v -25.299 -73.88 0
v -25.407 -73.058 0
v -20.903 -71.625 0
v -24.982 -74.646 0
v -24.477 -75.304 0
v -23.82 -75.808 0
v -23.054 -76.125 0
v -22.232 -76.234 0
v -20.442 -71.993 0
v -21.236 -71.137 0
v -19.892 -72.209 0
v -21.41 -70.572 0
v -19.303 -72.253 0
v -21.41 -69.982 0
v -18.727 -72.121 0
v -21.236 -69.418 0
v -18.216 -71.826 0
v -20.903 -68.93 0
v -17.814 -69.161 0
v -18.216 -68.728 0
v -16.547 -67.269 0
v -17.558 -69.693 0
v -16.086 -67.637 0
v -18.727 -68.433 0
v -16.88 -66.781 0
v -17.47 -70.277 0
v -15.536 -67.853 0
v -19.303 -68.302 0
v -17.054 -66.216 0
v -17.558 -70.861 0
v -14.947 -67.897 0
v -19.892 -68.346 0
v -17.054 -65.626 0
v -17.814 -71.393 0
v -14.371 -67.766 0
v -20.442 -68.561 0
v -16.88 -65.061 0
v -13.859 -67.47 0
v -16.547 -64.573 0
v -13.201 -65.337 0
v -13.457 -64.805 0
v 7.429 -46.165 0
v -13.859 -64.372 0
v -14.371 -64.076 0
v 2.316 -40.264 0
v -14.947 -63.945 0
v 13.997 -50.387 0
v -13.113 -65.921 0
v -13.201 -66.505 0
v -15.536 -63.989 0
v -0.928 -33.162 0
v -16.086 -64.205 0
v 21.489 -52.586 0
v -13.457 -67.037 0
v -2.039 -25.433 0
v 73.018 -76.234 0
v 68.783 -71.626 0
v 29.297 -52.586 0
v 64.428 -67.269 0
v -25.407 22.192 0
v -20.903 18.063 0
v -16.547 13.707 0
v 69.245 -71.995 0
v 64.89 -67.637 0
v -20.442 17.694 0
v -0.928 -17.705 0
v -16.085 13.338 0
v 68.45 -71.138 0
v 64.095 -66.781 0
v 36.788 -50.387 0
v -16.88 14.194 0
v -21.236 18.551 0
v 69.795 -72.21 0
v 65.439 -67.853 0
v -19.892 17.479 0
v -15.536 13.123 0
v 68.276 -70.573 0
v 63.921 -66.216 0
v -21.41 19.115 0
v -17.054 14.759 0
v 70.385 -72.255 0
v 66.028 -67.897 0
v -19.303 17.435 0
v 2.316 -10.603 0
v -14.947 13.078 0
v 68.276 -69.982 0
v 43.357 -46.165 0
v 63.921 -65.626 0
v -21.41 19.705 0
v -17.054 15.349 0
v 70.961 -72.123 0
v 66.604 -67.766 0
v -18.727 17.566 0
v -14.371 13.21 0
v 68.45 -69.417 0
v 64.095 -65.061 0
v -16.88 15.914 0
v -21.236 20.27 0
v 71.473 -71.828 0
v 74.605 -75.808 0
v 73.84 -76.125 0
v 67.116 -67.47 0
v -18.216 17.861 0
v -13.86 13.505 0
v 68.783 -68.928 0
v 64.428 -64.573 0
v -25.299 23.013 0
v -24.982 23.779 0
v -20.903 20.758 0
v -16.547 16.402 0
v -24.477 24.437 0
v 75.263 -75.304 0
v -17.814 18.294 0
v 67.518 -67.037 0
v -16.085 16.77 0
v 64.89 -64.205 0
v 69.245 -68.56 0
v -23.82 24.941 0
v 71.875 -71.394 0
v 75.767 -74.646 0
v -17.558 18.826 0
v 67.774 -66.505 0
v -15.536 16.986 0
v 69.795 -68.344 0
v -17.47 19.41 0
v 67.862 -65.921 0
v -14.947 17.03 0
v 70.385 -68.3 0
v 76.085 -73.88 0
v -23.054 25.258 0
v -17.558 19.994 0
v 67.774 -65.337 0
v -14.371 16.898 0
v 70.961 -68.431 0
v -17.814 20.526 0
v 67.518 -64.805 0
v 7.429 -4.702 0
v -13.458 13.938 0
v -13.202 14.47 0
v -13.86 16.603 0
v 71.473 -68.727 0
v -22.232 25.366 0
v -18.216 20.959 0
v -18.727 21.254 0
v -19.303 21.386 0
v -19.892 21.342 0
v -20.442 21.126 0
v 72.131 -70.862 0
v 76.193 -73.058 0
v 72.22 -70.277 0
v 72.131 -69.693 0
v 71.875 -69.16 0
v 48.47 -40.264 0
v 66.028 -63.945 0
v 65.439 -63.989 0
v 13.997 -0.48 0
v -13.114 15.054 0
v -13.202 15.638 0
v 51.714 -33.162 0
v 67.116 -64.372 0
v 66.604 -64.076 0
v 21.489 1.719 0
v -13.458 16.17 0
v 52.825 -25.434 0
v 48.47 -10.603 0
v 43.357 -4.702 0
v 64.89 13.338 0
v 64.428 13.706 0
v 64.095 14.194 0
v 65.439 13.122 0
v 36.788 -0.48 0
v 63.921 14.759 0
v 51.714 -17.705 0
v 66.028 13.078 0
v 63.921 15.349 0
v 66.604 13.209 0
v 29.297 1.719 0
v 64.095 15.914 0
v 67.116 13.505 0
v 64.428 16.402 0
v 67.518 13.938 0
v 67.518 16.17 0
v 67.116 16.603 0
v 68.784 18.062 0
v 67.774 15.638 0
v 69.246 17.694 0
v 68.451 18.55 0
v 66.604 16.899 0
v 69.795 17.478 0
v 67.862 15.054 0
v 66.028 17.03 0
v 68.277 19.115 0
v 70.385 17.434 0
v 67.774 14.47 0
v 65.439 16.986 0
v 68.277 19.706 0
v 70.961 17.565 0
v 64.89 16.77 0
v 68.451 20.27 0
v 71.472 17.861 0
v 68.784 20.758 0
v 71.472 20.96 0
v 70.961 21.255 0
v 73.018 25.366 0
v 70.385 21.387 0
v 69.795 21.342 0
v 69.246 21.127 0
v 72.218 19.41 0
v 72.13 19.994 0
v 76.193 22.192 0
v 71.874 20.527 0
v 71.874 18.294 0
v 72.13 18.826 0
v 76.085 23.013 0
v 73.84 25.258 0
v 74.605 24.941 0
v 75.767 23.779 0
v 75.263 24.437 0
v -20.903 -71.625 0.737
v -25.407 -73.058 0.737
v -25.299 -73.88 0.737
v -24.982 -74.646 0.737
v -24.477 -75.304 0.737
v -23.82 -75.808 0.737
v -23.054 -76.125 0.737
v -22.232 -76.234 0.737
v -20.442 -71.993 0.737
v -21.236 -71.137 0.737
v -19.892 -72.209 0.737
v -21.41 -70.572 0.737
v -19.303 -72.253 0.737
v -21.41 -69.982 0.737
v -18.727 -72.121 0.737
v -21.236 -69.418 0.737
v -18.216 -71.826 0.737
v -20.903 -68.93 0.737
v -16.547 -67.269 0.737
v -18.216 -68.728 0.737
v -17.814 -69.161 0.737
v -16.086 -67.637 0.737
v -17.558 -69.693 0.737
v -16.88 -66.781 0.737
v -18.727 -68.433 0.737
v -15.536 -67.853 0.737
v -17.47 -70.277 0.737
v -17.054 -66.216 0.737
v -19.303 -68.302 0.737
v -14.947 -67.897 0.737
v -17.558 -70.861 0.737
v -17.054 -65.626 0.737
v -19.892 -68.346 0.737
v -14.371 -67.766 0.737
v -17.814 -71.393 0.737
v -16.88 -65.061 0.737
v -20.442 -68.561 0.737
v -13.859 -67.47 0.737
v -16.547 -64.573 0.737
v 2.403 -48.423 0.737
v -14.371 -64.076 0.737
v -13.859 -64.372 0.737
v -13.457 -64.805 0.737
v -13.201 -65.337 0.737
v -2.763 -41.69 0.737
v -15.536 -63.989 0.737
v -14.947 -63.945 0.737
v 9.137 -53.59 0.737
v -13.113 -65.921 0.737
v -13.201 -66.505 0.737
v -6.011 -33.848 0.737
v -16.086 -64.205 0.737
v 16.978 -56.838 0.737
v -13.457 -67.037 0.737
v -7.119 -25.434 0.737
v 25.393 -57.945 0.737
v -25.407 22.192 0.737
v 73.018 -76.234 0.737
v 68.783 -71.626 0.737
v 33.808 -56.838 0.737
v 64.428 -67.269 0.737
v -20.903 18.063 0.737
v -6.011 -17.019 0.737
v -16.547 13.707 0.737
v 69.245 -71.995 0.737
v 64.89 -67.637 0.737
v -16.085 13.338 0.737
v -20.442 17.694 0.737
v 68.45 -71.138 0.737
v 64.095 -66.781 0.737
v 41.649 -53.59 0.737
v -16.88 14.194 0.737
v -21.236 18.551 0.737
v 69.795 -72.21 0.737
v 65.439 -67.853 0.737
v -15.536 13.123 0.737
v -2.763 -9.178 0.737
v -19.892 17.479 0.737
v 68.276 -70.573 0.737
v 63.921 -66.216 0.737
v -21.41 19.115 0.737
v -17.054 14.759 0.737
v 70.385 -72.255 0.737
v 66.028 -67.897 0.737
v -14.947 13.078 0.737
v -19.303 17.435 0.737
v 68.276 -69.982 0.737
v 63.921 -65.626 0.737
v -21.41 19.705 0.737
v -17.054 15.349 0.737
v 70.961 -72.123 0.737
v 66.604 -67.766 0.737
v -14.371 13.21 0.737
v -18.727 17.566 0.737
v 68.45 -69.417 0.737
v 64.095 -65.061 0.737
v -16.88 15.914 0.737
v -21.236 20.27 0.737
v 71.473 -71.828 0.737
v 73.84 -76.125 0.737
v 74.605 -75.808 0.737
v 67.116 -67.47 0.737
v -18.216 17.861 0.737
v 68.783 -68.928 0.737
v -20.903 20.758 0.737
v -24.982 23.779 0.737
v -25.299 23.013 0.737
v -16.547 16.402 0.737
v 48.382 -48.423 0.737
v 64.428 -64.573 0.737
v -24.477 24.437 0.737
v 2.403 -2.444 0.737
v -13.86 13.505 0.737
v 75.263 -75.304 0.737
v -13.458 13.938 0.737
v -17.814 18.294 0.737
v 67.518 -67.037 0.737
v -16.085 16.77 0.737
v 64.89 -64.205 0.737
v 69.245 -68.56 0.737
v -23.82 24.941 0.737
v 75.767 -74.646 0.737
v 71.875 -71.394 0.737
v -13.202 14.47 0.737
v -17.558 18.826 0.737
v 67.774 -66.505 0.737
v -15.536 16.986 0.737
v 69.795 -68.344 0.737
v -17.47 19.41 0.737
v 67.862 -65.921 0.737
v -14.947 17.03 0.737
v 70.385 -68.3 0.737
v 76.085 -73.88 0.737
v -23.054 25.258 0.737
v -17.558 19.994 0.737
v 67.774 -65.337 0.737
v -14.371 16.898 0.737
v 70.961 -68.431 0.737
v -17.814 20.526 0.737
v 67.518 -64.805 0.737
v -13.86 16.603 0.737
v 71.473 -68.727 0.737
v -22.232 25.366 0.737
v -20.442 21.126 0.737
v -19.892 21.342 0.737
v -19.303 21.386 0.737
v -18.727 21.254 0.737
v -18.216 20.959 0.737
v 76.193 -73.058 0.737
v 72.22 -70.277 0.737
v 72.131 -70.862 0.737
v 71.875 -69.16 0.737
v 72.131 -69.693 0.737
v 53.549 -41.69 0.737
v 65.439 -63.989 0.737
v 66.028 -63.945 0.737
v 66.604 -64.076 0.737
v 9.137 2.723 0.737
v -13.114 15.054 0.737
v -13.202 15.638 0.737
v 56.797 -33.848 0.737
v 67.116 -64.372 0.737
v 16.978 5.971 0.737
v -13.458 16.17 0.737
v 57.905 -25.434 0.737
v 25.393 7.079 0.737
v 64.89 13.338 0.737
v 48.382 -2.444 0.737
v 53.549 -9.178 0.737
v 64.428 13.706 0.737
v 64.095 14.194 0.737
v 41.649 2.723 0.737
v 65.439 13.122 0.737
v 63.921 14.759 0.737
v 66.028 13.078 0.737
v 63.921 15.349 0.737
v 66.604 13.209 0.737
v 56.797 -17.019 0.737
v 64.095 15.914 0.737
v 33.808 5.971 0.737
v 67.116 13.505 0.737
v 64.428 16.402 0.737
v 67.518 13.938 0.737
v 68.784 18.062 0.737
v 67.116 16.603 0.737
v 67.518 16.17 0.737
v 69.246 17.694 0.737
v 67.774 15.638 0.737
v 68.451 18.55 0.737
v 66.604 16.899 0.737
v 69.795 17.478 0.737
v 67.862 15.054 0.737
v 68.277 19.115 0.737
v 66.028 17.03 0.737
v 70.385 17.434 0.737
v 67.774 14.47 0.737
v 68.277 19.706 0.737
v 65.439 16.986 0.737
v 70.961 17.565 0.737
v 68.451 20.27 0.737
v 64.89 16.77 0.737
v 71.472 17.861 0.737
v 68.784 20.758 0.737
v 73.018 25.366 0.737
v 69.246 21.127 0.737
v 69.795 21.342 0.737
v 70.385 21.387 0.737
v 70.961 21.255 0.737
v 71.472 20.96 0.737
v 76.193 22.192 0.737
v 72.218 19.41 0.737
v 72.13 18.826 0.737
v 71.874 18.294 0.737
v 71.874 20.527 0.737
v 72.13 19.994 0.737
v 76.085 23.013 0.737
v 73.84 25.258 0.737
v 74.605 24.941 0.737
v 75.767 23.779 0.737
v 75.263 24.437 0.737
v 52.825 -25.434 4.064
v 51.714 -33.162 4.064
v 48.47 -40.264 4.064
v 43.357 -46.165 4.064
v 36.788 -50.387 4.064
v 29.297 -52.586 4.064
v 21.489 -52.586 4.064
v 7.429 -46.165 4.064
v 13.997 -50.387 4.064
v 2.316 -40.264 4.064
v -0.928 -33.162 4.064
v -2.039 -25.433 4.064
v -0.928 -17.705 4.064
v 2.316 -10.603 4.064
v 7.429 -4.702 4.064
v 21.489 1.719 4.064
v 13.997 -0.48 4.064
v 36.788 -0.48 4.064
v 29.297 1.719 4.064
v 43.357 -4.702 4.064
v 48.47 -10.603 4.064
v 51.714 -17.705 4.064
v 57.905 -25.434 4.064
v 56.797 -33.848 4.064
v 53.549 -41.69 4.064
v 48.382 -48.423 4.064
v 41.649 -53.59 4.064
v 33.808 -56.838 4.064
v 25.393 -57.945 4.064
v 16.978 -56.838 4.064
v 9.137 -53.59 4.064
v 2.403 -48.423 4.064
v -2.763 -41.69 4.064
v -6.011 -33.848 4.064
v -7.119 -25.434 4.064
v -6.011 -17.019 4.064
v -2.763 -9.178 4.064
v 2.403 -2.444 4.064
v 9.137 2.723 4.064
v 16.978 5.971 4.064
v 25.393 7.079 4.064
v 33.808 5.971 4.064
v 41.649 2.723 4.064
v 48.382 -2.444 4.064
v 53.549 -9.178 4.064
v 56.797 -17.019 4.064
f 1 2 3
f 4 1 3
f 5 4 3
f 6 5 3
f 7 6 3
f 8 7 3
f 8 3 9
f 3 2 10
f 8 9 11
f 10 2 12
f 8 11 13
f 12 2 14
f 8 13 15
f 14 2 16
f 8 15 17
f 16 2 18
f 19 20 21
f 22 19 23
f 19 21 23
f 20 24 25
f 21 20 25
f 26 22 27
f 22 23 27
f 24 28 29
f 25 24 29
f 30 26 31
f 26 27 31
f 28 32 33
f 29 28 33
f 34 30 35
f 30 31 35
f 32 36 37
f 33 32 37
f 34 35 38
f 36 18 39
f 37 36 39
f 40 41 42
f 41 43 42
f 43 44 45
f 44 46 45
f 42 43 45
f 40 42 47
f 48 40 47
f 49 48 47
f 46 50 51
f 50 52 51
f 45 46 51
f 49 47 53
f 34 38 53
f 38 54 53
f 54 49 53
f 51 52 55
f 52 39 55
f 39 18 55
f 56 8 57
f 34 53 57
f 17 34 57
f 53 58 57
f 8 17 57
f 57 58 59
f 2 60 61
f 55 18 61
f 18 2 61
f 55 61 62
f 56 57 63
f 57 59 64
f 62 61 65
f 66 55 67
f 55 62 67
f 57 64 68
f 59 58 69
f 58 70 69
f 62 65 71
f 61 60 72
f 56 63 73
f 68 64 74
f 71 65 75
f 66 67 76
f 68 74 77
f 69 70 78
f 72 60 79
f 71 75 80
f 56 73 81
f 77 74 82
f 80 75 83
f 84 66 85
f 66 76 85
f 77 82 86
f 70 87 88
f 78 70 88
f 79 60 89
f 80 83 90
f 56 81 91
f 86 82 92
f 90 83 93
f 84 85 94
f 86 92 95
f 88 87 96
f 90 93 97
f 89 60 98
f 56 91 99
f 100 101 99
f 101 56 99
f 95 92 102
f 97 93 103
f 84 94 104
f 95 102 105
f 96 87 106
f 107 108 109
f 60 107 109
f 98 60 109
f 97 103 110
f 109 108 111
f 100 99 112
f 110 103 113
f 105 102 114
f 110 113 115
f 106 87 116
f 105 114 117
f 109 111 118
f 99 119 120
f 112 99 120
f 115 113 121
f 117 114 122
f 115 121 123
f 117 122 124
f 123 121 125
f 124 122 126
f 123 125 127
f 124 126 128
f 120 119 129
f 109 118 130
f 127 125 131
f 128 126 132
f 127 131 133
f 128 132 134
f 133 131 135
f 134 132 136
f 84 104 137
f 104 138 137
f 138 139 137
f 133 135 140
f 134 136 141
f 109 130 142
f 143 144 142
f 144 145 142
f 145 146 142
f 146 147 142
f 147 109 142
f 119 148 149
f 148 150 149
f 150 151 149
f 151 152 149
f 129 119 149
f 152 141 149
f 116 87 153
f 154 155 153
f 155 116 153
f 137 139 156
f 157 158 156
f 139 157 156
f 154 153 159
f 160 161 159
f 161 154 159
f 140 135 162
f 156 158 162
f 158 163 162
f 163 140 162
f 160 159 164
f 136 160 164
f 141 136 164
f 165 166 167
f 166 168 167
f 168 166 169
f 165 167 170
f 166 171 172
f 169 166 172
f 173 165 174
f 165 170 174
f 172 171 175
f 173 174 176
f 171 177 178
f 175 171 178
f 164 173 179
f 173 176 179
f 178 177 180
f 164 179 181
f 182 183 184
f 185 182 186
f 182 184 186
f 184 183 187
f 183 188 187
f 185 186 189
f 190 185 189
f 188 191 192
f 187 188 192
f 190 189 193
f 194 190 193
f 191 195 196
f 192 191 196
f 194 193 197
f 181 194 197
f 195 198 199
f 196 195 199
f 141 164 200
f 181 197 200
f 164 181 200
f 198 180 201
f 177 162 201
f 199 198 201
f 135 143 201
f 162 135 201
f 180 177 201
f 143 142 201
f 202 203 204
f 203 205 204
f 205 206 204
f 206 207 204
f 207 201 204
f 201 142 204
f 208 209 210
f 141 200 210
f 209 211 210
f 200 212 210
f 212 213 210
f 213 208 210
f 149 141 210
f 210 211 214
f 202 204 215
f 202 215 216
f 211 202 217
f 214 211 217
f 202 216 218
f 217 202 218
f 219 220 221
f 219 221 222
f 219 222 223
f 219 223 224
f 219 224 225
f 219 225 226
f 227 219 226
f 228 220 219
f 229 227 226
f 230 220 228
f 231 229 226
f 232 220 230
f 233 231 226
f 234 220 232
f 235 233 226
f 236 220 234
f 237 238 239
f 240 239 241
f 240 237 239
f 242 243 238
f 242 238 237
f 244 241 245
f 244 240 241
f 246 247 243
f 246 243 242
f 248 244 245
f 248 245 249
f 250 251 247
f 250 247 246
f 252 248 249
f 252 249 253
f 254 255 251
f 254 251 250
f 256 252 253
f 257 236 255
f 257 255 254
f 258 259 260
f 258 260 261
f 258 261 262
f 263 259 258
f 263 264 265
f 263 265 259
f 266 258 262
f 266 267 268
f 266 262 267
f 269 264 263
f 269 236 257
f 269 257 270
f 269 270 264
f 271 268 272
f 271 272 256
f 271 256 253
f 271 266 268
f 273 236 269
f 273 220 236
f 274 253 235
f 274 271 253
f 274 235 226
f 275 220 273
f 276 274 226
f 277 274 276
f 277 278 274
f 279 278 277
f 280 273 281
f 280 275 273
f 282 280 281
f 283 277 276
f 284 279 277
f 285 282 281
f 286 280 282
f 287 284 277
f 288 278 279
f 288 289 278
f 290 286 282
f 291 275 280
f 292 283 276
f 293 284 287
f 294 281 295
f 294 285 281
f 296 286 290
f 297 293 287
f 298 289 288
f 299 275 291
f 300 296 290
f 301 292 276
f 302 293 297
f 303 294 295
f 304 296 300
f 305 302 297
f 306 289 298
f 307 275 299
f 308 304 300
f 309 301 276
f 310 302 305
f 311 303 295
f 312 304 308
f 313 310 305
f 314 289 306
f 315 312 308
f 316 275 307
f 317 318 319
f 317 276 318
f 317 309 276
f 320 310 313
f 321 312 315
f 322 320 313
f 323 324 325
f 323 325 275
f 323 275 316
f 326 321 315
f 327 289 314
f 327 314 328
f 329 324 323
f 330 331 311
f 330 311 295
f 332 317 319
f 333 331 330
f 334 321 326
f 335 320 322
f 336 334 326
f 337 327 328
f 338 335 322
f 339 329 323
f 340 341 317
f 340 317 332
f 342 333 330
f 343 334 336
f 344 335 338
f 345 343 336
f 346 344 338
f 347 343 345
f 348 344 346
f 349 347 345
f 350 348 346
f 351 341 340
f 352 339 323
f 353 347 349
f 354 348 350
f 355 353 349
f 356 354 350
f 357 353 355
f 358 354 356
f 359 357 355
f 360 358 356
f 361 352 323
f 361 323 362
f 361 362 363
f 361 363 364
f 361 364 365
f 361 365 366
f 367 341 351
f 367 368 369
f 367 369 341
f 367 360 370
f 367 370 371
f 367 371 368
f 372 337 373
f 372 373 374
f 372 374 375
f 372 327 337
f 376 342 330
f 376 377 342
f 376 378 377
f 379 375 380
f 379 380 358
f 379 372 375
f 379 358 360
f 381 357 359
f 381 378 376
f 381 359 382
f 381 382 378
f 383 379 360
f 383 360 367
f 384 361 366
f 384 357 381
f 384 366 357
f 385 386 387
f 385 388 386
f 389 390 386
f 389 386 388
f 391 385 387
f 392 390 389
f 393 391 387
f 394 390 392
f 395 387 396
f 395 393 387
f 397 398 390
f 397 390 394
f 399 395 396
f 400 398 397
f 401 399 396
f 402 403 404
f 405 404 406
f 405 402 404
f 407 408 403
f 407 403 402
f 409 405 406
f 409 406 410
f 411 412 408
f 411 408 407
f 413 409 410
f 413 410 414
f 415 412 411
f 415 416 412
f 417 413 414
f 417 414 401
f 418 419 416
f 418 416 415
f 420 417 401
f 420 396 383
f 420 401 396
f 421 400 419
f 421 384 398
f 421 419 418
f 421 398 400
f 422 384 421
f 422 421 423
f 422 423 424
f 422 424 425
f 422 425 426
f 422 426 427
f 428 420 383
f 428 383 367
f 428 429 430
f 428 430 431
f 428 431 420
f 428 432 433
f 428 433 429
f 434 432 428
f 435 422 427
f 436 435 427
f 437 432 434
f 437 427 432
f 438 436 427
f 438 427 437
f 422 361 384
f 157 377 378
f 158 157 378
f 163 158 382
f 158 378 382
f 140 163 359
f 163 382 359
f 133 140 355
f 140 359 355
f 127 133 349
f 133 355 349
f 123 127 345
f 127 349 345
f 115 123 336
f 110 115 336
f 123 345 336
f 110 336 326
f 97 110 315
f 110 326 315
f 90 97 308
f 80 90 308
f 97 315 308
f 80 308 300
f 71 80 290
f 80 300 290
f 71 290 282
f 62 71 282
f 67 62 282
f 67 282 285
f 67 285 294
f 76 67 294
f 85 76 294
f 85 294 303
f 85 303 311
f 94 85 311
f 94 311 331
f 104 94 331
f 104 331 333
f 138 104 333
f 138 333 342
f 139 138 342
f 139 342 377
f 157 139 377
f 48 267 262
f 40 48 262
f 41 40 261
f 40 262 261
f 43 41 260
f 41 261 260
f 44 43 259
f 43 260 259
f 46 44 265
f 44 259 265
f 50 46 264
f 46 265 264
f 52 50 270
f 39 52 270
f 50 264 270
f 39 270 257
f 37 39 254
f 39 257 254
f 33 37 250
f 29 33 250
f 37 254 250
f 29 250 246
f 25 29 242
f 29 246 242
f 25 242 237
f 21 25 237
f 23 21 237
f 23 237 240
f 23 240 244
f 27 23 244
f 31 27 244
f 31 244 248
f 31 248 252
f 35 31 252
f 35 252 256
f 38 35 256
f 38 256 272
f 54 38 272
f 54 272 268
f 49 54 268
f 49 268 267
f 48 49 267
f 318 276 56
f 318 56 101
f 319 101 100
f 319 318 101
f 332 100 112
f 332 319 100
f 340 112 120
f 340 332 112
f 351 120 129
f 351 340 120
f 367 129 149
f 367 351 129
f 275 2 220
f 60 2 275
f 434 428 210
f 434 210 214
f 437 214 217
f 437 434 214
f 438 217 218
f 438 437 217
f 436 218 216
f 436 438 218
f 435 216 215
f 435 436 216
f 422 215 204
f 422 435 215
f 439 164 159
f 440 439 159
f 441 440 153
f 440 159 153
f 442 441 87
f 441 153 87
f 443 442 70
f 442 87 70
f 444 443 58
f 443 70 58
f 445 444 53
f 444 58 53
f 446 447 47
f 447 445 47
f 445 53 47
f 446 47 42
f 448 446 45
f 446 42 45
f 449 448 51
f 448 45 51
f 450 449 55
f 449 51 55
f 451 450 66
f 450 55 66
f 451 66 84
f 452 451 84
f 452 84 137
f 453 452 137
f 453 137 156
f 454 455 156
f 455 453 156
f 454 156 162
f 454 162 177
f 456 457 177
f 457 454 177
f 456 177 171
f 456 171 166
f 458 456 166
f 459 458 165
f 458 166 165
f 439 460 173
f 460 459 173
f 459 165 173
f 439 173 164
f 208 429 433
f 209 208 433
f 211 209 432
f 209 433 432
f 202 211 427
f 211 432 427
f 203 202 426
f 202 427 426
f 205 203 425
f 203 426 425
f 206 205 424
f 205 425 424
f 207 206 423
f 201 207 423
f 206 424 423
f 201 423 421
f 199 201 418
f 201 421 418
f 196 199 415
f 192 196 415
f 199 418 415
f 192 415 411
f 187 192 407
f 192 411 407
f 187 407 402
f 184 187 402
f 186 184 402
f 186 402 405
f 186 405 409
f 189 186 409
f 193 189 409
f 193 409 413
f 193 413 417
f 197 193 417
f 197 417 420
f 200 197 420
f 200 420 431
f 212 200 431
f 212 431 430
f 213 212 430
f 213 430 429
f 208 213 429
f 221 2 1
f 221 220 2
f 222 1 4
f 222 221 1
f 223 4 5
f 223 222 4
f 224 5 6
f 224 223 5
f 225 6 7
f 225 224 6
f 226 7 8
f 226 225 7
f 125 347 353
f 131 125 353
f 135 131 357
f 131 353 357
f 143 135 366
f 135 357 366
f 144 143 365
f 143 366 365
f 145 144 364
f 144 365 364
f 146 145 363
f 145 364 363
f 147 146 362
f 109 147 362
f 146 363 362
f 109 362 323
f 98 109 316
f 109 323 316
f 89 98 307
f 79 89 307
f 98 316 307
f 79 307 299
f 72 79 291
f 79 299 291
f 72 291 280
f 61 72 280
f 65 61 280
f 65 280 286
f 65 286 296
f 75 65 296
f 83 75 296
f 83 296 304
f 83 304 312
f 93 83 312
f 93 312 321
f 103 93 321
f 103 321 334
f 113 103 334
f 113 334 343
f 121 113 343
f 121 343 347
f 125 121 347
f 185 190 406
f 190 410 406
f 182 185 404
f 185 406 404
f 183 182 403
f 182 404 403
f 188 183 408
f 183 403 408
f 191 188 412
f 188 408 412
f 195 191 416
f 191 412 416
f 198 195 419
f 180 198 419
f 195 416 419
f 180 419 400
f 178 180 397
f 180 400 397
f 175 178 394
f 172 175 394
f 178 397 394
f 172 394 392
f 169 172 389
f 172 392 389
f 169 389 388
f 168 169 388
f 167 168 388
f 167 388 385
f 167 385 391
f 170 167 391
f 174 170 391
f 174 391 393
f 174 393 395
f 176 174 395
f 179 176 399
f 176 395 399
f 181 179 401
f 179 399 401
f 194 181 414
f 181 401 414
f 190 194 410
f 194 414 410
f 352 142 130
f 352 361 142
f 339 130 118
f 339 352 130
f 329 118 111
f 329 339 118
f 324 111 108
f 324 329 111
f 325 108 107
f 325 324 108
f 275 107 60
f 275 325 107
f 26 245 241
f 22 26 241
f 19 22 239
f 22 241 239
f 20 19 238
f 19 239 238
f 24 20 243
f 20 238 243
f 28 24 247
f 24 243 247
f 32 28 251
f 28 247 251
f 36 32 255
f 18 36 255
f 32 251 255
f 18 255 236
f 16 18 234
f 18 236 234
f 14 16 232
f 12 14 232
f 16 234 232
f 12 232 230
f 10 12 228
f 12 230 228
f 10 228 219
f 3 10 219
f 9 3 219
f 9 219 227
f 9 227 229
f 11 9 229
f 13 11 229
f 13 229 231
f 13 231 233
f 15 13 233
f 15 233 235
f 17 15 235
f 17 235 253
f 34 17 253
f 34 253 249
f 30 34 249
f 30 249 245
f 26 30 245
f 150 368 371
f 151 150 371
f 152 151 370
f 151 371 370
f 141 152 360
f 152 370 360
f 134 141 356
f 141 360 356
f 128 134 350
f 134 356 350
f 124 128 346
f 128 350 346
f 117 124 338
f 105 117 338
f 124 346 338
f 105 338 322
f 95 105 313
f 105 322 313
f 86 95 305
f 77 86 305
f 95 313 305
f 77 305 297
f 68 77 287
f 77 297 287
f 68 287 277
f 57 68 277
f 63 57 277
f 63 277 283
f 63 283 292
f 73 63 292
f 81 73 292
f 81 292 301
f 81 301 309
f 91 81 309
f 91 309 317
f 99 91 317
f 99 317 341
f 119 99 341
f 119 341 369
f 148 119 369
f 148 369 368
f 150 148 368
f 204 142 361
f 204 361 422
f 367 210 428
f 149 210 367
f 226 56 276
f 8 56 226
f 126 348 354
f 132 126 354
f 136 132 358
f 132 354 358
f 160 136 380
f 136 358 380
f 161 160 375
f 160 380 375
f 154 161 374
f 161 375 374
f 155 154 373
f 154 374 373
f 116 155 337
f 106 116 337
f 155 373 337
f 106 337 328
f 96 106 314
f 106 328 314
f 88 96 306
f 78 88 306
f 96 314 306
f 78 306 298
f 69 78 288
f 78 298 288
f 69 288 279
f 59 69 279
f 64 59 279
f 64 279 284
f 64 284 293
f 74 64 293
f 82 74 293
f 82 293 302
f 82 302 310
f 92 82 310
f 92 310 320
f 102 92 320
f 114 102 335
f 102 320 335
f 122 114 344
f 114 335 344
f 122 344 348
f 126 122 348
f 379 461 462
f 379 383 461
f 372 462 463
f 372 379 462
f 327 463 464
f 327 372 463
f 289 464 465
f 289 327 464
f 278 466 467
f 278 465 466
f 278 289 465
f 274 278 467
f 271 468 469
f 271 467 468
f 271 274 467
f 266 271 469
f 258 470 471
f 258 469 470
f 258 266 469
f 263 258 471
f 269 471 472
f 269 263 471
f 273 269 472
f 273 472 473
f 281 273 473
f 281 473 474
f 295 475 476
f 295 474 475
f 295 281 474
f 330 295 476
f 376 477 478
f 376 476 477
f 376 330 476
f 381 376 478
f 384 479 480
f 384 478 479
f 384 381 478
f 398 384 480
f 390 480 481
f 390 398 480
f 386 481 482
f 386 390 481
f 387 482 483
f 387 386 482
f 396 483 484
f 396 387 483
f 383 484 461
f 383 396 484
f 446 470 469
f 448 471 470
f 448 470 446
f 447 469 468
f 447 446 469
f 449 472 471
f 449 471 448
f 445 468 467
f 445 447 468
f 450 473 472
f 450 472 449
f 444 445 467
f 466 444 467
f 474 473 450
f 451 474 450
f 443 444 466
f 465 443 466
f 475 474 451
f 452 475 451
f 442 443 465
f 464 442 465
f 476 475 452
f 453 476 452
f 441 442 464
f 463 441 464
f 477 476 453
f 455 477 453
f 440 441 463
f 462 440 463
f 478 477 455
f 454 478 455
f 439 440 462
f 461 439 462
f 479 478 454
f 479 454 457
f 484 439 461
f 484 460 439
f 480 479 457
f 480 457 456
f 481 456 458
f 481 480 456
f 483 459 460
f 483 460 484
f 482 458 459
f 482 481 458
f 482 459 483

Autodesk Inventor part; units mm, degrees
ref_plane "YZ Plane" through (0, 0, 0) normal (1, 0, 0) x (0, 1, 0)
ref_plane "XZ Plane" through (0, 0, 0) normal (0, 1, 0) x (-1, 0, 0)
ref_plane "XY Plane" through (0, 0, 0) normal (0, 0, 1) x (1, 0, 0)
sketch "Sketch1" plane through (0, 0, 0) normal (0, 0, 1) x (1, 0, 0)
  line L0 (-25.4072, 25.3665) -> (76.1928, 25.3665)
  line L1 (76.1928, 25.3665) -> (76.1928, -76.2335)
  line L2 (76.1928, -76.2335) -> (-25.4072, -76.2335)
  line L3 (-25.4072, -76.2335) -> (-25.4072, 25.3665)
  point P0 (0, 0)
  dimension "d0" = 101.6
  dimension "d1" = 101.6
extrude "Extrusion1" add sketch "Sketch1" along normal blind 0.7366
sketch "Sketch2" plane through (0, 0, 0.7366) normal (0, 0, 1) x (1, 0, 0)
  line L0 (-25.4072, 25.3665) -> (76.1928, -76.2335)
  line L1 (76.1928, 25.3665) -> (-25.4072, -76.2335)
  circle A0 centre (25.3928, -25.4335) radius 27.432
  point P0 (0, 0)
  dimension "d4" = 54.864
extrude "Extrusion2" cut sketch "Sketch2" against normal blind 0.7366
sketch "Sketch3" plane through (0, 0, 0.7366) normal (0, 0, 1) x (1, 0, 0)
  line L0 (-25.4072, -76.2335) -> (-25.4072, 25.3665) projected
  line L1 (-25.4072, 25.3665) -> (-25.4072, -25.4335)
  line L2 (-25.4072, -25.4335) -> (-25.4072, 19.4102)
  line L3 (-25.4072, 25.3665) -> (76.1928, -76.2335)
  line L4 (76.1928, 25.3665) -> (-25.4072, -76.2335)
  circle A0 centre (-19.4509, 19.4102) radius 1.9812
  point P0 (0, 0)
  dimension "d7" = 44.8437
  dimension "d8" = 3.9624
extrude "Extrusion3" cut sketch "Sketch3" against normal blind 0.7366 contours A0 L3 | L3 A0
sketch "Sketch4" plane through (0, 0, 0.7366) normal (0, 0, 1) x (1, 0, 0)
  line L0 (-25.4072, -76.2335) -> (76.1928, 25.3665)
  line L1 (-25.4072, 25.3665) -> (76.1928, -76.2335)
  circle A0 centre (70.2365, 19.4102) radius 1.9819
  circle A1 centre (70.2365, -70.2772) radius 1.983
  circle A2 centre (-19.4509, -70.2772) radius 1.9812
  point P0 (0, 0)
extrude "Extrusion4" cut sketch "Sketch4" against normal blind 0.7366
sketch "Sketch5" plane through (0, 0, 0.7366) normal (0, 0, 1) x (1, 0, 0)
  circle A0 centre (25.3928, -25.4335) radius 27.432 projected
  circle A1 centre (25.3928, -25.4335) radius 29.972
  circle A2 centre (25.3928, -25.4335) radius 32.512
  point P0 (0, 0)
  dimension "d13" = 59.944
  dimension "d14" = 65.024
extrude "Extrusion5" add sketch "Sketch5" along normal blind 6.6548 contours A2
fillet "Fillet1" radius 3.175 4 edges at (-25.4072, 25.3665, 0.3683) (76.1928, 25.3665, 0.3683) (76.1928, -76.2335, 0.3683) (-25.4072, -76.2335, 0.3683)
sketch "Sketch6" plane through (25.3928, -25.4335, 7.3914) normal (0, 0, 1) x (1, 0, 0)
  circle A0 centre (0, 0) radius 29.972 projected
  circle A1 centre (0, 0) radius 32.512 projected
  point P0 (-25.3928, 25.4335)
extrude "Extrusion6" cut sketch "Sketch6" against normal blind 3.3274
sketch "Sketch7" plane through (25.3928, -25.4335, 0.7366) normal (0, 0, 1) x (1, 0, 0)
  circle A0 centre (0, 0) radius 29.972 projected
  circle A1 centre (0, 0) radius 27.432 projected
  point P0 (-25.3928, 25.4335)
extrude "Extrusion7" add sketch "Sketch7" along normal blind 3.3274
sketch "Sketch8" plane through (0, 0, 0.7366) normal (0, 0, 1) x (1, 0, 0)
  circle A0 centre (-19.4509, 19.4102) radius 1.9812 projected
  circle A1 centre (70.2365, -70.2772) radius 1.983 projected
  circle A2 centre (-19.4509, -70.2772) radius 1.9812 projected
  circle A3 centre (70.2365, 19.4102) radius 1.9819 projected
  line L0 (-19.4509, 19.4102) -> (70.2365, -70.2772)
  line L1 (-19.4509, -70.2772) -> (70.2365, 19.4102)
  line L2 (-25.4072, 25.3665) -> (76.1928, 25.3665)
  line L3 (76.1928, 25.3665) -> (76.1928, -76.2335)
  line L4 (76.1928, -76.2335) -> (-25.4072, -76.2335)
  line L5 (-25.4072, -76.2335) -> (-25.4072, 25.3665)
  line L6 (-25.4072, 25.3665) -> (-25.4072, -25.4335)
  line L7 (-25.4072, -25.4335) -> (-25.4072, 15.0541)
  circle A4 centre (-15.0948, 15.0541) radius 1.9812
  circle A5 centre (65.8804, 15.0541) radius 1.9816
  circle A6 centre (65.8804, -65.9211) radius 1.9817
  circle A7 centre (-15.0948, -65.9211) radius 1.9817
  point P0 (0, 0)
  dimension "d22" = 40.4876
  dimension "d23" = 3.9624
extrude "Extrusion8" cut sketch "Sketch8" against normal blind 3.3274 contours A5 L1 | L1 A5 | A6 L0 | L0 A6 | A7 L1 | L1 A7 | A4 L0 | L0 A4
properties part number "3"
